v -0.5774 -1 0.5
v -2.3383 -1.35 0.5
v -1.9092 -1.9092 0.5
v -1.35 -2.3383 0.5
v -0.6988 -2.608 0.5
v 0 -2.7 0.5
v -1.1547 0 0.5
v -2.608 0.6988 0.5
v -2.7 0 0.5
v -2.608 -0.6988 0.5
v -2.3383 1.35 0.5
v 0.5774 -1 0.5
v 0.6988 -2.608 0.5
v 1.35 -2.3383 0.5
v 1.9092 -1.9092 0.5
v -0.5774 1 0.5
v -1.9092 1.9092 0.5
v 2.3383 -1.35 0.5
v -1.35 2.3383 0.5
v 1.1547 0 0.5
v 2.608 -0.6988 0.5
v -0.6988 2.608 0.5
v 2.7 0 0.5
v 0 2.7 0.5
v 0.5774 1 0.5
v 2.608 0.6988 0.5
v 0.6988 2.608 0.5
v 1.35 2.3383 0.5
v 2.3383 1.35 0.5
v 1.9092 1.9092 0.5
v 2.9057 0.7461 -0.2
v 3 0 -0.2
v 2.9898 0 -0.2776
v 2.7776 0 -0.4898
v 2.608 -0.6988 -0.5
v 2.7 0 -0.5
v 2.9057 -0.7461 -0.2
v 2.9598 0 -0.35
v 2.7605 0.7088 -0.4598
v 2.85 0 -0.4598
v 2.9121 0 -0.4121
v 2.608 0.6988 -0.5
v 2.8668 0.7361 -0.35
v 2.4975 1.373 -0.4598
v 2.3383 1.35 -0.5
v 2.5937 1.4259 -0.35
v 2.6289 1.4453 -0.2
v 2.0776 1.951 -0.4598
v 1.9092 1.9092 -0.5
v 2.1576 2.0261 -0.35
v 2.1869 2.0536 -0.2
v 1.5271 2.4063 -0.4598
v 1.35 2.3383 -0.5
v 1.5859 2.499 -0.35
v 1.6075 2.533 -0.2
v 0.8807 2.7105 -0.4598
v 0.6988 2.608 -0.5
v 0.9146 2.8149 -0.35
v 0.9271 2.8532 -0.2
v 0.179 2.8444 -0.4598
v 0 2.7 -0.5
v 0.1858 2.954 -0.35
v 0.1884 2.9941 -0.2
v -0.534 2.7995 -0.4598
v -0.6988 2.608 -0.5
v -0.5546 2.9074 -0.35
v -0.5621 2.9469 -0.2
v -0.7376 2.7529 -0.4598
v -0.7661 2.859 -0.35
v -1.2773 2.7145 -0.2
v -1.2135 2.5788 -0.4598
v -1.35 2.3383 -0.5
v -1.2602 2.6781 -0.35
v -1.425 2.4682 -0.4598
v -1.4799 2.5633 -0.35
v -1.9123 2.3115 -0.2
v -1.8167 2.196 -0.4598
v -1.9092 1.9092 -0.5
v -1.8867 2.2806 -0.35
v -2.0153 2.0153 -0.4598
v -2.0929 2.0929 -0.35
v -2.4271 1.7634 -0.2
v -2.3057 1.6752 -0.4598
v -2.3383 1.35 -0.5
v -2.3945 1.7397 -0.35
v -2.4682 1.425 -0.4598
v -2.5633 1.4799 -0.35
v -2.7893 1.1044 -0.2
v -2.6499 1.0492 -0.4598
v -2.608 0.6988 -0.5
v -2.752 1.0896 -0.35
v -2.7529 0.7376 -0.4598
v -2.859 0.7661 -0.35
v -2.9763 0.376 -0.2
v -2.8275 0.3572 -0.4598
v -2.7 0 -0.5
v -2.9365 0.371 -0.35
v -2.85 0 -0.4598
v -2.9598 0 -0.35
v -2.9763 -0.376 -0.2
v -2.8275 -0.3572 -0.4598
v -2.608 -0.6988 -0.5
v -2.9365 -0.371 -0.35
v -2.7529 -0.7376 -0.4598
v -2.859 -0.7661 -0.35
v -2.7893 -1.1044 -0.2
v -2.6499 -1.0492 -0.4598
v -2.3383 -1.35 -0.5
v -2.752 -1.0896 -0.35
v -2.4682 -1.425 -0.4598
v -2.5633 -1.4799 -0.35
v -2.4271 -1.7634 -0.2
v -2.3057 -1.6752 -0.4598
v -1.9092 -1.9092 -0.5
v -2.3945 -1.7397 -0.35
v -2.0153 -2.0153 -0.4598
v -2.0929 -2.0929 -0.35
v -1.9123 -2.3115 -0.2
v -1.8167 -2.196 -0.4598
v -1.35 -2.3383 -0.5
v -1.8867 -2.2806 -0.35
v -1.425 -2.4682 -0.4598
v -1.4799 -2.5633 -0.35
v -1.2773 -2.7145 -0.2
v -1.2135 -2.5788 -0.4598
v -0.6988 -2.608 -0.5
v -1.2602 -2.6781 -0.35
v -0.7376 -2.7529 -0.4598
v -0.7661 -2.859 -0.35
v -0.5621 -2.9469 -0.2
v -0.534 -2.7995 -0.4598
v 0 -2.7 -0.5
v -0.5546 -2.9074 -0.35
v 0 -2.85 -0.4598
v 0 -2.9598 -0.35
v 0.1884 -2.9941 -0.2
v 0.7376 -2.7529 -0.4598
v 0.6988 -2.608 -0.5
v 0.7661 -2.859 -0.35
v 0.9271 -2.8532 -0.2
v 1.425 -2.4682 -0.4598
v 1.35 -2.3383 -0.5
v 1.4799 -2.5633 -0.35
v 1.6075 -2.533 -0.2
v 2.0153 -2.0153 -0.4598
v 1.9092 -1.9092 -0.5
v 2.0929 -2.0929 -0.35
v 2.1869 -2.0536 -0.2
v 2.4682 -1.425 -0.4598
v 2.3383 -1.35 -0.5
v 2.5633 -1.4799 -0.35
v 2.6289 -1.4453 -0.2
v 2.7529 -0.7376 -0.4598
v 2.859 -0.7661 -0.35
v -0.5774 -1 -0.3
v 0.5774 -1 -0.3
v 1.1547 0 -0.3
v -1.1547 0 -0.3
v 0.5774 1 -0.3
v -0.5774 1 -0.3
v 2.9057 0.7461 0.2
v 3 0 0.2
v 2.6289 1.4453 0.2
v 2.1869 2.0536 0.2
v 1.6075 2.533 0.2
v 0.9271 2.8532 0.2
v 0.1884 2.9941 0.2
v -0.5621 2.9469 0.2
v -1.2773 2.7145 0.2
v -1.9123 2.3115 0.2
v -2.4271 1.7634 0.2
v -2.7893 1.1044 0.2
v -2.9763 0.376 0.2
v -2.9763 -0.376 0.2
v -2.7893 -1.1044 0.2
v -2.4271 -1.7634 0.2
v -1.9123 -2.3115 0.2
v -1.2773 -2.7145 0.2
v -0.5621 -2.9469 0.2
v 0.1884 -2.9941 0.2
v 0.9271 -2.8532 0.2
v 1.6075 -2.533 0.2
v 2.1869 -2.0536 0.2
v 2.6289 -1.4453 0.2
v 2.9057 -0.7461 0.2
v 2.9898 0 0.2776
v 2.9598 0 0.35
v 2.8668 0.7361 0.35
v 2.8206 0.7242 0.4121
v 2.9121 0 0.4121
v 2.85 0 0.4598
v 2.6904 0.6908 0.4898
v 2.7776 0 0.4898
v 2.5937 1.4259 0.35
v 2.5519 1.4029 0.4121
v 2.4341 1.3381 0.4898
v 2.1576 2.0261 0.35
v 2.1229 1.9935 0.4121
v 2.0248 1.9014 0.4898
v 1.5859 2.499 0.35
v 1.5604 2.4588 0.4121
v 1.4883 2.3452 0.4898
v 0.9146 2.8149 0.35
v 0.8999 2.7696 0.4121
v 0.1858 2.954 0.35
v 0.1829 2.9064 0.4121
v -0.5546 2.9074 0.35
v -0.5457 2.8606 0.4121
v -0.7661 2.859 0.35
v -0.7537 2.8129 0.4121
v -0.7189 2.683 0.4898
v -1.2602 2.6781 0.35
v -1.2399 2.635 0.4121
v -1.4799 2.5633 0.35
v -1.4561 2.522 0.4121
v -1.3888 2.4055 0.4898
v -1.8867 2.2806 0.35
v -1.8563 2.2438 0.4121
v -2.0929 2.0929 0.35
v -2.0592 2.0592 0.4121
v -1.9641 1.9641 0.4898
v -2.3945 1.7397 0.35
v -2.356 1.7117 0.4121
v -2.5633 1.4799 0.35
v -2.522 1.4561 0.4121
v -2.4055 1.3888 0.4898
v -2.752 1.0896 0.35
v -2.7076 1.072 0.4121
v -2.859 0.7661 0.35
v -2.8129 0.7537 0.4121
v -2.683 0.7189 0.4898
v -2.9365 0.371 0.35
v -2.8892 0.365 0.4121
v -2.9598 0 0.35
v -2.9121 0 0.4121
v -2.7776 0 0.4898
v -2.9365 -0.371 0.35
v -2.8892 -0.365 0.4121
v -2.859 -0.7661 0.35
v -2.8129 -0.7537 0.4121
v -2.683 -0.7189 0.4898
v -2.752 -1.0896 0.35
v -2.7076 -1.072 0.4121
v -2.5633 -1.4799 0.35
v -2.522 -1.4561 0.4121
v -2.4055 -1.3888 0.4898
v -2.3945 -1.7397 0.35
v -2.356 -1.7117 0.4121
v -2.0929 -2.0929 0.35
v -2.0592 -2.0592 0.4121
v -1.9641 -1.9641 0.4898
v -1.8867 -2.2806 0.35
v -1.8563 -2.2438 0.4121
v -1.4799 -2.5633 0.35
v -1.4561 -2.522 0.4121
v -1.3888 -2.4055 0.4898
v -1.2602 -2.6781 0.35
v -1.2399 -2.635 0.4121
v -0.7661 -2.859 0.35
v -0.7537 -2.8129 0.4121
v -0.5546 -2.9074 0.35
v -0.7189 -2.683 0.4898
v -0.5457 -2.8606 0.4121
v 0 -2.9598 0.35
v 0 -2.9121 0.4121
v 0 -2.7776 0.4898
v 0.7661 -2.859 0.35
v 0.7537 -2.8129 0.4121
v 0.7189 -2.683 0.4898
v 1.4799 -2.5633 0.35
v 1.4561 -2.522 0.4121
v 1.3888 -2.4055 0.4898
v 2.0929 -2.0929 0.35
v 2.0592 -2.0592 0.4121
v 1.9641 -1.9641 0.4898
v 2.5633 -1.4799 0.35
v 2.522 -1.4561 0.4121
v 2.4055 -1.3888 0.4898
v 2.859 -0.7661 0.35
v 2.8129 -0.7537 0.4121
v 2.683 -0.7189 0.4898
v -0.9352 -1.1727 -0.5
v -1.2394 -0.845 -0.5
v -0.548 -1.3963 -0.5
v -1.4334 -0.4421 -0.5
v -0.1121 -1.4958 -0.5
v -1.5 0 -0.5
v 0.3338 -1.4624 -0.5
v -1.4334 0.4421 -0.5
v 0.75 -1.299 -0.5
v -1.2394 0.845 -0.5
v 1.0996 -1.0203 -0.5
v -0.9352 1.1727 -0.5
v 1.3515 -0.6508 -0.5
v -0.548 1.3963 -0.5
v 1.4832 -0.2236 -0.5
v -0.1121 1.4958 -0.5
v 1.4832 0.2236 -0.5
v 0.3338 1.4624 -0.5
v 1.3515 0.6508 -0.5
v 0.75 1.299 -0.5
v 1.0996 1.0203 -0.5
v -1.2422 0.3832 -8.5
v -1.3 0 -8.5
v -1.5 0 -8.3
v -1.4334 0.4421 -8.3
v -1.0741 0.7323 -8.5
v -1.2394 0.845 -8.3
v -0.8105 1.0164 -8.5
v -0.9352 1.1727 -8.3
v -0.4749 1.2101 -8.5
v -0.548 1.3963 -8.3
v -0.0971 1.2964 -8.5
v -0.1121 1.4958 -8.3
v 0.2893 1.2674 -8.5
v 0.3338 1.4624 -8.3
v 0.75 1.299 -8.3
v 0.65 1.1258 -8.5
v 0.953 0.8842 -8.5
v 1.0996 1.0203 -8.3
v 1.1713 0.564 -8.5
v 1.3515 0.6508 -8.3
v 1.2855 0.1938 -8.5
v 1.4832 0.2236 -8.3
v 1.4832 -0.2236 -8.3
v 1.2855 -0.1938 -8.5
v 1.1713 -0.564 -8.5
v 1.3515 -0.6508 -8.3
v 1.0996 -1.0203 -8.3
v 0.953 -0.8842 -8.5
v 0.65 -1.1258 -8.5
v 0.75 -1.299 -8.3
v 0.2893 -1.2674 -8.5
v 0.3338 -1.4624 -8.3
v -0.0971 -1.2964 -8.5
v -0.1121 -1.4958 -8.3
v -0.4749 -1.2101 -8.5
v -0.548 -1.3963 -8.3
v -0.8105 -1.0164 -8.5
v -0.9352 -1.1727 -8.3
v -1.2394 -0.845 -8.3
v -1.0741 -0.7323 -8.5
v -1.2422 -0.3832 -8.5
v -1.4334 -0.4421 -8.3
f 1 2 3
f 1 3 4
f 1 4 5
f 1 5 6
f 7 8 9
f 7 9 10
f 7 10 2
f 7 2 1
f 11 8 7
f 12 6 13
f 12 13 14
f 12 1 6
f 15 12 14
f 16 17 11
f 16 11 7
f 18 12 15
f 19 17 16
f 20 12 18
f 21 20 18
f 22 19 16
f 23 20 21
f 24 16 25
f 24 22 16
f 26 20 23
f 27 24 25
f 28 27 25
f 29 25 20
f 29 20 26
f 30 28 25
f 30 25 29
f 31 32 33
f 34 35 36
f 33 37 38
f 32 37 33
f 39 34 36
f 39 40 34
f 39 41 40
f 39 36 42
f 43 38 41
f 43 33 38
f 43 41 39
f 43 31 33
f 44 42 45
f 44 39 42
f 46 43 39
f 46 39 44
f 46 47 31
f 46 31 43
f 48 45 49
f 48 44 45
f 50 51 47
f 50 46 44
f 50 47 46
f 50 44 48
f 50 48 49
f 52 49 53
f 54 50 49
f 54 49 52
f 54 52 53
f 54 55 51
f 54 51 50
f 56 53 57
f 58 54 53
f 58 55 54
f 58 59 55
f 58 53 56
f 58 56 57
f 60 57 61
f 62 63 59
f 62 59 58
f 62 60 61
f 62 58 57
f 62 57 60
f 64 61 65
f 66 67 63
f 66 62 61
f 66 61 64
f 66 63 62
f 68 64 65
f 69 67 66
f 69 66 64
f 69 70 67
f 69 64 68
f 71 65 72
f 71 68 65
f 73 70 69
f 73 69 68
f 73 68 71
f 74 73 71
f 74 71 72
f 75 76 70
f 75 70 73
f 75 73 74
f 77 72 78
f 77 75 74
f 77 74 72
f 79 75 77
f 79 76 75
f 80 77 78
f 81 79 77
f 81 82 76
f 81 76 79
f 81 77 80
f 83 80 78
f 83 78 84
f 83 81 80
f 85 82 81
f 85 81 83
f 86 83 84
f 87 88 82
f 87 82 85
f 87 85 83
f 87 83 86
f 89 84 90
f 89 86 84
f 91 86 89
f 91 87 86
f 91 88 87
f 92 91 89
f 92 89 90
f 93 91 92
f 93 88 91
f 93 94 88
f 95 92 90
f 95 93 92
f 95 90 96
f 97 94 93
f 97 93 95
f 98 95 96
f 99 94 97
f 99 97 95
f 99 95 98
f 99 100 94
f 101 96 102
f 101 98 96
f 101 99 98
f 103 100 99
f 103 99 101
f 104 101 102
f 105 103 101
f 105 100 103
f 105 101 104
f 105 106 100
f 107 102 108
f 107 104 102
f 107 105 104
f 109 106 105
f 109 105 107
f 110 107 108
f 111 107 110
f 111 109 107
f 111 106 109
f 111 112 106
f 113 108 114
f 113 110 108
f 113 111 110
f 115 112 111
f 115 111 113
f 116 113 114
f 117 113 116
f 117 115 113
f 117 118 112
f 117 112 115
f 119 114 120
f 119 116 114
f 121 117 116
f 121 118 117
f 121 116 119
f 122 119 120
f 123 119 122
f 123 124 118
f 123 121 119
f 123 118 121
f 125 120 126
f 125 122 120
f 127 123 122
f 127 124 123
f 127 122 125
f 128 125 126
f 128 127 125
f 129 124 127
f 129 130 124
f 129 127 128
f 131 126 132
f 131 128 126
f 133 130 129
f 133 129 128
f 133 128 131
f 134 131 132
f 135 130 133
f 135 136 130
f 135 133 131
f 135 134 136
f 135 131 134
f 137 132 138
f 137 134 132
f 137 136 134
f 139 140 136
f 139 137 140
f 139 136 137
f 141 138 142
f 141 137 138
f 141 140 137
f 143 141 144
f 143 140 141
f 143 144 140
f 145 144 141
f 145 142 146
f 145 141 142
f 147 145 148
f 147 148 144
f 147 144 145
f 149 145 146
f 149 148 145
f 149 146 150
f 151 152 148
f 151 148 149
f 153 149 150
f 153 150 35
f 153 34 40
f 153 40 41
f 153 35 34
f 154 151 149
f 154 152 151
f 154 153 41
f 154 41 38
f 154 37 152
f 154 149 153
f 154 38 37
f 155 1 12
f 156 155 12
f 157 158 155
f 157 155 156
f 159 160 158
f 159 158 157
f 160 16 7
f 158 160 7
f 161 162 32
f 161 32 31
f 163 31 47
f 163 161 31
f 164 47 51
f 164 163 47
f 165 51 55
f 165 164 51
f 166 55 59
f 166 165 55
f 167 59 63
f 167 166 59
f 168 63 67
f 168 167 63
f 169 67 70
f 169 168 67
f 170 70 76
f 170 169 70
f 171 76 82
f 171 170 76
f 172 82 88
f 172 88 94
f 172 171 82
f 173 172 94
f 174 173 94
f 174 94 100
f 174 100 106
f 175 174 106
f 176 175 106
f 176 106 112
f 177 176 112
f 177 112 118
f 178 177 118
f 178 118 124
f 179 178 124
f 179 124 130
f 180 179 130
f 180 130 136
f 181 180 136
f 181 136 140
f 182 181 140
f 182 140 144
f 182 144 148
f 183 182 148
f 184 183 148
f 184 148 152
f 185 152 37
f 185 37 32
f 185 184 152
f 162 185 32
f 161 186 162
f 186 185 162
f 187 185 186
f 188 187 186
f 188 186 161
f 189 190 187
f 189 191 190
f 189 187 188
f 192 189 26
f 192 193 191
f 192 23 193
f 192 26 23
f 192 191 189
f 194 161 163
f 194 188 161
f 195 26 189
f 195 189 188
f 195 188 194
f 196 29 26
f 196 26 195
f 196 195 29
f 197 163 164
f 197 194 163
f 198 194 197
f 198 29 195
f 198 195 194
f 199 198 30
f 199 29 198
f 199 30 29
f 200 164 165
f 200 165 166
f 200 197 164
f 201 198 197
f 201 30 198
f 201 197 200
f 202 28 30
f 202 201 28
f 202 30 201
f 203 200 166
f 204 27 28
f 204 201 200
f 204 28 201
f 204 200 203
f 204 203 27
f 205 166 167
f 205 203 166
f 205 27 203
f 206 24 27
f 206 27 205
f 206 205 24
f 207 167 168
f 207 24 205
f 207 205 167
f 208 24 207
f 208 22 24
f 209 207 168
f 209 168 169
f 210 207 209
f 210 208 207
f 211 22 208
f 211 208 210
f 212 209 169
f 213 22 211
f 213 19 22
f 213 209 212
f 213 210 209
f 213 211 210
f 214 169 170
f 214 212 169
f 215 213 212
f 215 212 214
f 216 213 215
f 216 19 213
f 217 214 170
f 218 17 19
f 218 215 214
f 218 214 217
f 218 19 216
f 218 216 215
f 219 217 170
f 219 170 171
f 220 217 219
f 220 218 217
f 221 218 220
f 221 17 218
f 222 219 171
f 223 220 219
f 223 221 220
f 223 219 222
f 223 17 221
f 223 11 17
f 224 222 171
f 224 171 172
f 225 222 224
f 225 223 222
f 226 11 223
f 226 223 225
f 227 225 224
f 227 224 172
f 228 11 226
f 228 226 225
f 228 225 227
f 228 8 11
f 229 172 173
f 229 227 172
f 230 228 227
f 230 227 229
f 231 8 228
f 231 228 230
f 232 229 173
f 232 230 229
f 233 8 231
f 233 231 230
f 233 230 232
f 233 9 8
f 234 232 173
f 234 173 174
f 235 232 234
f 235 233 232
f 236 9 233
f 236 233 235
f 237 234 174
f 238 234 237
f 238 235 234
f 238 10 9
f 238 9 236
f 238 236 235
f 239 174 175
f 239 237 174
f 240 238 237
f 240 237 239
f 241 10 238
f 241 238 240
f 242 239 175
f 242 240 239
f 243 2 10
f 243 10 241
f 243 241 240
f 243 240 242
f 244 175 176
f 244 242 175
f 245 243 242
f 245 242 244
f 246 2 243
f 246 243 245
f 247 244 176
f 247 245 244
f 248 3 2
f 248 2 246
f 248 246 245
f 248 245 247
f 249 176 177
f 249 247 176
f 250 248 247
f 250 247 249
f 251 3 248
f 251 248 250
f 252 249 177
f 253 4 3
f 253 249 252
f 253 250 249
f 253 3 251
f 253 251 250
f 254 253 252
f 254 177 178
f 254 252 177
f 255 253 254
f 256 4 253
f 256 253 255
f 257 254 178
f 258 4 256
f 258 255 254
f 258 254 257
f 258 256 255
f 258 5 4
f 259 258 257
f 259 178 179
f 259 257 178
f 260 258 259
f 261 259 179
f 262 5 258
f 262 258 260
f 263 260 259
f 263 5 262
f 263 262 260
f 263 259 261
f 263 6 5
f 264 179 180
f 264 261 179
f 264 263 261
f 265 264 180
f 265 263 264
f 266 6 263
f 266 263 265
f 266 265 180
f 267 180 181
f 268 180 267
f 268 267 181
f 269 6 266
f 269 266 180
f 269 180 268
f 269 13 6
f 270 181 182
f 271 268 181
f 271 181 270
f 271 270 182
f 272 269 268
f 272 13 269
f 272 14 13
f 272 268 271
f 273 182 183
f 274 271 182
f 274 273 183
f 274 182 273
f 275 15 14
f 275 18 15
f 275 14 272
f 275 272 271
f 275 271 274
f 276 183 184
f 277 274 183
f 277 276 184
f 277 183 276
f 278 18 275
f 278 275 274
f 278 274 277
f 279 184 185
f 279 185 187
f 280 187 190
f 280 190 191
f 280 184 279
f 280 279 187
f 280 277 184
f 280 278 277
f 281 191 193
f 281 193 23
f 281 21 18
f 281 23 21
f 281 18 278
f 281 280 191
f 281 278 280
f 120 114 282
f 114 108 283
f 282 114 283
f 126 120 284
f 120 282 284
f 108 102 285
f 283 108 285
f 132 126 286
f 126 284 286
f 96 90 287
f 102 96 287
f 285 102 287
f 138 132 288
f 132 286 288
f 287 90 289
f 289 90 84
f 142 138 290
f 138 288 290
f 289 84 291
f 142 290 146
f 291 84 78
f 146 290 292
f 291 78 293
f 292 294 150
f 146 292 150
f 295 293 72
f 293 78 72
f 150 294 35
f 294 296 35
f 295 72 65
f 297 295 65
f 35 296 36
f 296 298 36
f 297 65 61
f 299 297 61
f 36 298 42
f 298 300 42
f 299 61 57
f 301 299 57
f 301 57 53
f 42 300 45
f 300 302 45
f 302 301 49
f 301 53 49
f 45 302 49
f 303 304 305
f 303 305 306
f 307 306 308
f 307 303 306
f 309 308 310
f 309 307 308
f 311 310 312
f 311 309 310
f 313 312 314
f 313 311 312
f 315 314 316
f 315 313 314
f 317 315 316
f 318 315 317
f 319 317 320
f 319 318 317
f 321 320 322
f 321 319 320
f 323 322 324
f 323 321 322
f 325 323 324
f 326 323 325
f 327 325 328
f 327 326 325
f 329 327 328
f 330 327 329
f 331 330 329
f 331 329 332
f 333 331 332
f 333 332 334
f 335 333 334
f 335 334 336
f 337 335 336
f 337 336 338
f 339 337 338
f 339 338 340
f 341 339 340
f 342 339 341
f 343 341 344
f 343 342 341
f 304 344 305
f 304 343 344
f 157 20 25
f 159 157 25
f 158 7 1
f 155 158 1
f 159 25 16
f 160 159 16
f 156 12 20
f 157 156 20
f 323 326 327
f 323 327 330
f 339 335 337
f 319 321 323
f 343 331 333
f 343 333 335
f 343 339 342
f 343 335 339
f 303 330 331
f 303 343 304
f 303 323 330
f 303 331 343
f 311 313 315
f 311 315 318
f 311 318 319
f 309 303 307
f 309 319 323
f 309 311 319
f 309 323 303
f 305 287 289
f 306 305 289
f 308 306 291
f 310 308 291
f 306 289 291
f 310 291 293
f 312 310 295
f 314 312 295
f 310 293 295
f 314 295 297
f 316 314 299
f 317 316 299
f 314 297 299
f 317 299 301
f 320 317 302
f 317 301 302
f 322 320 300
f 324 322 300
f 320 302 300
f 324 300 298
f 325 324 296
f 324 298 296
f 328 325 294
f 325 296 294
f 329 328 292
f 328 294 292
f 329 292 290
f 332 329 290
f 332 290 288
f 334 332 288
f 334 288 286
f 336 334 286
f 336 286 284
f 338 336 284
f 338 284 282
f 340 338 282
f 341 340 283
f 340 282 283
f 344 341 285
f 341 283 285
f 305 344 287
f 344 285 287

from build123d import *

# Parameters (mm, degrees)
SKETCH_1_R          = 3
EXTRUDE_1_DEPTH     = 0.5
SKETCH_2_R          = 1.5
EXTRUDE_2_DEPTH     = 8
CHAMFER_1_SIZE      = 0.2
CUT_EXTRUDE_1_DEPTH = 0.8
FILLET_2_R          = 0.3


with BuildPart() as part:
    # 草图1 → 凸台-拉伸1 (new body, symmetric)
    with BuildSketch(Plane.XY):
        Circle(SKETCH_1_R)
    extrude(amount=EXTRUDE_1_DEPTH, both=True)

    # 草图2 → 凸台-拉伸2 (add)
    with BuildSketch(Plane(origin=(0, 0, -0.5), x_dir=(-1, 0, 0), z_dir=(0, 0, -1))):
        Circle(SKETCH_2_R)
    extrude(amount=EXTRUDE_2_DEPTH)

    # 倒角1
    chamfer_1_edges = [part.edges().sort_by_distance(p)[0] for p in [
        (1.5, 0, -8.5),
    ]]
    chamfer(chamfer_1_edges, length=CHAMFER_1_SIZE)

    # 草图3 → 切除-拉伸1 (cut)
    with BuildSketch(Plane.XY.offset(0.5)):
        Polygon((1.154700538, 0), (0.577350269, 1), (-0.577350269, 1), (-1.154700538, 0), (-0.577350269, -1), (0.577350269, -1), align=None)
    extrude(amount=-CUT_EXTRUDE_1_DEPTH, mode=Mode.SUBTRACT)

    # 圆角2
    fillet_2_edges = [part.edges().sort_by_distance(p)[0] for p in [
        (-3, 0, -0.5),
        (-3, 0, 0.5),
    ]]
    fillet(fillet_2_edges, radius=FILLET_2_R)


solid = part.part
